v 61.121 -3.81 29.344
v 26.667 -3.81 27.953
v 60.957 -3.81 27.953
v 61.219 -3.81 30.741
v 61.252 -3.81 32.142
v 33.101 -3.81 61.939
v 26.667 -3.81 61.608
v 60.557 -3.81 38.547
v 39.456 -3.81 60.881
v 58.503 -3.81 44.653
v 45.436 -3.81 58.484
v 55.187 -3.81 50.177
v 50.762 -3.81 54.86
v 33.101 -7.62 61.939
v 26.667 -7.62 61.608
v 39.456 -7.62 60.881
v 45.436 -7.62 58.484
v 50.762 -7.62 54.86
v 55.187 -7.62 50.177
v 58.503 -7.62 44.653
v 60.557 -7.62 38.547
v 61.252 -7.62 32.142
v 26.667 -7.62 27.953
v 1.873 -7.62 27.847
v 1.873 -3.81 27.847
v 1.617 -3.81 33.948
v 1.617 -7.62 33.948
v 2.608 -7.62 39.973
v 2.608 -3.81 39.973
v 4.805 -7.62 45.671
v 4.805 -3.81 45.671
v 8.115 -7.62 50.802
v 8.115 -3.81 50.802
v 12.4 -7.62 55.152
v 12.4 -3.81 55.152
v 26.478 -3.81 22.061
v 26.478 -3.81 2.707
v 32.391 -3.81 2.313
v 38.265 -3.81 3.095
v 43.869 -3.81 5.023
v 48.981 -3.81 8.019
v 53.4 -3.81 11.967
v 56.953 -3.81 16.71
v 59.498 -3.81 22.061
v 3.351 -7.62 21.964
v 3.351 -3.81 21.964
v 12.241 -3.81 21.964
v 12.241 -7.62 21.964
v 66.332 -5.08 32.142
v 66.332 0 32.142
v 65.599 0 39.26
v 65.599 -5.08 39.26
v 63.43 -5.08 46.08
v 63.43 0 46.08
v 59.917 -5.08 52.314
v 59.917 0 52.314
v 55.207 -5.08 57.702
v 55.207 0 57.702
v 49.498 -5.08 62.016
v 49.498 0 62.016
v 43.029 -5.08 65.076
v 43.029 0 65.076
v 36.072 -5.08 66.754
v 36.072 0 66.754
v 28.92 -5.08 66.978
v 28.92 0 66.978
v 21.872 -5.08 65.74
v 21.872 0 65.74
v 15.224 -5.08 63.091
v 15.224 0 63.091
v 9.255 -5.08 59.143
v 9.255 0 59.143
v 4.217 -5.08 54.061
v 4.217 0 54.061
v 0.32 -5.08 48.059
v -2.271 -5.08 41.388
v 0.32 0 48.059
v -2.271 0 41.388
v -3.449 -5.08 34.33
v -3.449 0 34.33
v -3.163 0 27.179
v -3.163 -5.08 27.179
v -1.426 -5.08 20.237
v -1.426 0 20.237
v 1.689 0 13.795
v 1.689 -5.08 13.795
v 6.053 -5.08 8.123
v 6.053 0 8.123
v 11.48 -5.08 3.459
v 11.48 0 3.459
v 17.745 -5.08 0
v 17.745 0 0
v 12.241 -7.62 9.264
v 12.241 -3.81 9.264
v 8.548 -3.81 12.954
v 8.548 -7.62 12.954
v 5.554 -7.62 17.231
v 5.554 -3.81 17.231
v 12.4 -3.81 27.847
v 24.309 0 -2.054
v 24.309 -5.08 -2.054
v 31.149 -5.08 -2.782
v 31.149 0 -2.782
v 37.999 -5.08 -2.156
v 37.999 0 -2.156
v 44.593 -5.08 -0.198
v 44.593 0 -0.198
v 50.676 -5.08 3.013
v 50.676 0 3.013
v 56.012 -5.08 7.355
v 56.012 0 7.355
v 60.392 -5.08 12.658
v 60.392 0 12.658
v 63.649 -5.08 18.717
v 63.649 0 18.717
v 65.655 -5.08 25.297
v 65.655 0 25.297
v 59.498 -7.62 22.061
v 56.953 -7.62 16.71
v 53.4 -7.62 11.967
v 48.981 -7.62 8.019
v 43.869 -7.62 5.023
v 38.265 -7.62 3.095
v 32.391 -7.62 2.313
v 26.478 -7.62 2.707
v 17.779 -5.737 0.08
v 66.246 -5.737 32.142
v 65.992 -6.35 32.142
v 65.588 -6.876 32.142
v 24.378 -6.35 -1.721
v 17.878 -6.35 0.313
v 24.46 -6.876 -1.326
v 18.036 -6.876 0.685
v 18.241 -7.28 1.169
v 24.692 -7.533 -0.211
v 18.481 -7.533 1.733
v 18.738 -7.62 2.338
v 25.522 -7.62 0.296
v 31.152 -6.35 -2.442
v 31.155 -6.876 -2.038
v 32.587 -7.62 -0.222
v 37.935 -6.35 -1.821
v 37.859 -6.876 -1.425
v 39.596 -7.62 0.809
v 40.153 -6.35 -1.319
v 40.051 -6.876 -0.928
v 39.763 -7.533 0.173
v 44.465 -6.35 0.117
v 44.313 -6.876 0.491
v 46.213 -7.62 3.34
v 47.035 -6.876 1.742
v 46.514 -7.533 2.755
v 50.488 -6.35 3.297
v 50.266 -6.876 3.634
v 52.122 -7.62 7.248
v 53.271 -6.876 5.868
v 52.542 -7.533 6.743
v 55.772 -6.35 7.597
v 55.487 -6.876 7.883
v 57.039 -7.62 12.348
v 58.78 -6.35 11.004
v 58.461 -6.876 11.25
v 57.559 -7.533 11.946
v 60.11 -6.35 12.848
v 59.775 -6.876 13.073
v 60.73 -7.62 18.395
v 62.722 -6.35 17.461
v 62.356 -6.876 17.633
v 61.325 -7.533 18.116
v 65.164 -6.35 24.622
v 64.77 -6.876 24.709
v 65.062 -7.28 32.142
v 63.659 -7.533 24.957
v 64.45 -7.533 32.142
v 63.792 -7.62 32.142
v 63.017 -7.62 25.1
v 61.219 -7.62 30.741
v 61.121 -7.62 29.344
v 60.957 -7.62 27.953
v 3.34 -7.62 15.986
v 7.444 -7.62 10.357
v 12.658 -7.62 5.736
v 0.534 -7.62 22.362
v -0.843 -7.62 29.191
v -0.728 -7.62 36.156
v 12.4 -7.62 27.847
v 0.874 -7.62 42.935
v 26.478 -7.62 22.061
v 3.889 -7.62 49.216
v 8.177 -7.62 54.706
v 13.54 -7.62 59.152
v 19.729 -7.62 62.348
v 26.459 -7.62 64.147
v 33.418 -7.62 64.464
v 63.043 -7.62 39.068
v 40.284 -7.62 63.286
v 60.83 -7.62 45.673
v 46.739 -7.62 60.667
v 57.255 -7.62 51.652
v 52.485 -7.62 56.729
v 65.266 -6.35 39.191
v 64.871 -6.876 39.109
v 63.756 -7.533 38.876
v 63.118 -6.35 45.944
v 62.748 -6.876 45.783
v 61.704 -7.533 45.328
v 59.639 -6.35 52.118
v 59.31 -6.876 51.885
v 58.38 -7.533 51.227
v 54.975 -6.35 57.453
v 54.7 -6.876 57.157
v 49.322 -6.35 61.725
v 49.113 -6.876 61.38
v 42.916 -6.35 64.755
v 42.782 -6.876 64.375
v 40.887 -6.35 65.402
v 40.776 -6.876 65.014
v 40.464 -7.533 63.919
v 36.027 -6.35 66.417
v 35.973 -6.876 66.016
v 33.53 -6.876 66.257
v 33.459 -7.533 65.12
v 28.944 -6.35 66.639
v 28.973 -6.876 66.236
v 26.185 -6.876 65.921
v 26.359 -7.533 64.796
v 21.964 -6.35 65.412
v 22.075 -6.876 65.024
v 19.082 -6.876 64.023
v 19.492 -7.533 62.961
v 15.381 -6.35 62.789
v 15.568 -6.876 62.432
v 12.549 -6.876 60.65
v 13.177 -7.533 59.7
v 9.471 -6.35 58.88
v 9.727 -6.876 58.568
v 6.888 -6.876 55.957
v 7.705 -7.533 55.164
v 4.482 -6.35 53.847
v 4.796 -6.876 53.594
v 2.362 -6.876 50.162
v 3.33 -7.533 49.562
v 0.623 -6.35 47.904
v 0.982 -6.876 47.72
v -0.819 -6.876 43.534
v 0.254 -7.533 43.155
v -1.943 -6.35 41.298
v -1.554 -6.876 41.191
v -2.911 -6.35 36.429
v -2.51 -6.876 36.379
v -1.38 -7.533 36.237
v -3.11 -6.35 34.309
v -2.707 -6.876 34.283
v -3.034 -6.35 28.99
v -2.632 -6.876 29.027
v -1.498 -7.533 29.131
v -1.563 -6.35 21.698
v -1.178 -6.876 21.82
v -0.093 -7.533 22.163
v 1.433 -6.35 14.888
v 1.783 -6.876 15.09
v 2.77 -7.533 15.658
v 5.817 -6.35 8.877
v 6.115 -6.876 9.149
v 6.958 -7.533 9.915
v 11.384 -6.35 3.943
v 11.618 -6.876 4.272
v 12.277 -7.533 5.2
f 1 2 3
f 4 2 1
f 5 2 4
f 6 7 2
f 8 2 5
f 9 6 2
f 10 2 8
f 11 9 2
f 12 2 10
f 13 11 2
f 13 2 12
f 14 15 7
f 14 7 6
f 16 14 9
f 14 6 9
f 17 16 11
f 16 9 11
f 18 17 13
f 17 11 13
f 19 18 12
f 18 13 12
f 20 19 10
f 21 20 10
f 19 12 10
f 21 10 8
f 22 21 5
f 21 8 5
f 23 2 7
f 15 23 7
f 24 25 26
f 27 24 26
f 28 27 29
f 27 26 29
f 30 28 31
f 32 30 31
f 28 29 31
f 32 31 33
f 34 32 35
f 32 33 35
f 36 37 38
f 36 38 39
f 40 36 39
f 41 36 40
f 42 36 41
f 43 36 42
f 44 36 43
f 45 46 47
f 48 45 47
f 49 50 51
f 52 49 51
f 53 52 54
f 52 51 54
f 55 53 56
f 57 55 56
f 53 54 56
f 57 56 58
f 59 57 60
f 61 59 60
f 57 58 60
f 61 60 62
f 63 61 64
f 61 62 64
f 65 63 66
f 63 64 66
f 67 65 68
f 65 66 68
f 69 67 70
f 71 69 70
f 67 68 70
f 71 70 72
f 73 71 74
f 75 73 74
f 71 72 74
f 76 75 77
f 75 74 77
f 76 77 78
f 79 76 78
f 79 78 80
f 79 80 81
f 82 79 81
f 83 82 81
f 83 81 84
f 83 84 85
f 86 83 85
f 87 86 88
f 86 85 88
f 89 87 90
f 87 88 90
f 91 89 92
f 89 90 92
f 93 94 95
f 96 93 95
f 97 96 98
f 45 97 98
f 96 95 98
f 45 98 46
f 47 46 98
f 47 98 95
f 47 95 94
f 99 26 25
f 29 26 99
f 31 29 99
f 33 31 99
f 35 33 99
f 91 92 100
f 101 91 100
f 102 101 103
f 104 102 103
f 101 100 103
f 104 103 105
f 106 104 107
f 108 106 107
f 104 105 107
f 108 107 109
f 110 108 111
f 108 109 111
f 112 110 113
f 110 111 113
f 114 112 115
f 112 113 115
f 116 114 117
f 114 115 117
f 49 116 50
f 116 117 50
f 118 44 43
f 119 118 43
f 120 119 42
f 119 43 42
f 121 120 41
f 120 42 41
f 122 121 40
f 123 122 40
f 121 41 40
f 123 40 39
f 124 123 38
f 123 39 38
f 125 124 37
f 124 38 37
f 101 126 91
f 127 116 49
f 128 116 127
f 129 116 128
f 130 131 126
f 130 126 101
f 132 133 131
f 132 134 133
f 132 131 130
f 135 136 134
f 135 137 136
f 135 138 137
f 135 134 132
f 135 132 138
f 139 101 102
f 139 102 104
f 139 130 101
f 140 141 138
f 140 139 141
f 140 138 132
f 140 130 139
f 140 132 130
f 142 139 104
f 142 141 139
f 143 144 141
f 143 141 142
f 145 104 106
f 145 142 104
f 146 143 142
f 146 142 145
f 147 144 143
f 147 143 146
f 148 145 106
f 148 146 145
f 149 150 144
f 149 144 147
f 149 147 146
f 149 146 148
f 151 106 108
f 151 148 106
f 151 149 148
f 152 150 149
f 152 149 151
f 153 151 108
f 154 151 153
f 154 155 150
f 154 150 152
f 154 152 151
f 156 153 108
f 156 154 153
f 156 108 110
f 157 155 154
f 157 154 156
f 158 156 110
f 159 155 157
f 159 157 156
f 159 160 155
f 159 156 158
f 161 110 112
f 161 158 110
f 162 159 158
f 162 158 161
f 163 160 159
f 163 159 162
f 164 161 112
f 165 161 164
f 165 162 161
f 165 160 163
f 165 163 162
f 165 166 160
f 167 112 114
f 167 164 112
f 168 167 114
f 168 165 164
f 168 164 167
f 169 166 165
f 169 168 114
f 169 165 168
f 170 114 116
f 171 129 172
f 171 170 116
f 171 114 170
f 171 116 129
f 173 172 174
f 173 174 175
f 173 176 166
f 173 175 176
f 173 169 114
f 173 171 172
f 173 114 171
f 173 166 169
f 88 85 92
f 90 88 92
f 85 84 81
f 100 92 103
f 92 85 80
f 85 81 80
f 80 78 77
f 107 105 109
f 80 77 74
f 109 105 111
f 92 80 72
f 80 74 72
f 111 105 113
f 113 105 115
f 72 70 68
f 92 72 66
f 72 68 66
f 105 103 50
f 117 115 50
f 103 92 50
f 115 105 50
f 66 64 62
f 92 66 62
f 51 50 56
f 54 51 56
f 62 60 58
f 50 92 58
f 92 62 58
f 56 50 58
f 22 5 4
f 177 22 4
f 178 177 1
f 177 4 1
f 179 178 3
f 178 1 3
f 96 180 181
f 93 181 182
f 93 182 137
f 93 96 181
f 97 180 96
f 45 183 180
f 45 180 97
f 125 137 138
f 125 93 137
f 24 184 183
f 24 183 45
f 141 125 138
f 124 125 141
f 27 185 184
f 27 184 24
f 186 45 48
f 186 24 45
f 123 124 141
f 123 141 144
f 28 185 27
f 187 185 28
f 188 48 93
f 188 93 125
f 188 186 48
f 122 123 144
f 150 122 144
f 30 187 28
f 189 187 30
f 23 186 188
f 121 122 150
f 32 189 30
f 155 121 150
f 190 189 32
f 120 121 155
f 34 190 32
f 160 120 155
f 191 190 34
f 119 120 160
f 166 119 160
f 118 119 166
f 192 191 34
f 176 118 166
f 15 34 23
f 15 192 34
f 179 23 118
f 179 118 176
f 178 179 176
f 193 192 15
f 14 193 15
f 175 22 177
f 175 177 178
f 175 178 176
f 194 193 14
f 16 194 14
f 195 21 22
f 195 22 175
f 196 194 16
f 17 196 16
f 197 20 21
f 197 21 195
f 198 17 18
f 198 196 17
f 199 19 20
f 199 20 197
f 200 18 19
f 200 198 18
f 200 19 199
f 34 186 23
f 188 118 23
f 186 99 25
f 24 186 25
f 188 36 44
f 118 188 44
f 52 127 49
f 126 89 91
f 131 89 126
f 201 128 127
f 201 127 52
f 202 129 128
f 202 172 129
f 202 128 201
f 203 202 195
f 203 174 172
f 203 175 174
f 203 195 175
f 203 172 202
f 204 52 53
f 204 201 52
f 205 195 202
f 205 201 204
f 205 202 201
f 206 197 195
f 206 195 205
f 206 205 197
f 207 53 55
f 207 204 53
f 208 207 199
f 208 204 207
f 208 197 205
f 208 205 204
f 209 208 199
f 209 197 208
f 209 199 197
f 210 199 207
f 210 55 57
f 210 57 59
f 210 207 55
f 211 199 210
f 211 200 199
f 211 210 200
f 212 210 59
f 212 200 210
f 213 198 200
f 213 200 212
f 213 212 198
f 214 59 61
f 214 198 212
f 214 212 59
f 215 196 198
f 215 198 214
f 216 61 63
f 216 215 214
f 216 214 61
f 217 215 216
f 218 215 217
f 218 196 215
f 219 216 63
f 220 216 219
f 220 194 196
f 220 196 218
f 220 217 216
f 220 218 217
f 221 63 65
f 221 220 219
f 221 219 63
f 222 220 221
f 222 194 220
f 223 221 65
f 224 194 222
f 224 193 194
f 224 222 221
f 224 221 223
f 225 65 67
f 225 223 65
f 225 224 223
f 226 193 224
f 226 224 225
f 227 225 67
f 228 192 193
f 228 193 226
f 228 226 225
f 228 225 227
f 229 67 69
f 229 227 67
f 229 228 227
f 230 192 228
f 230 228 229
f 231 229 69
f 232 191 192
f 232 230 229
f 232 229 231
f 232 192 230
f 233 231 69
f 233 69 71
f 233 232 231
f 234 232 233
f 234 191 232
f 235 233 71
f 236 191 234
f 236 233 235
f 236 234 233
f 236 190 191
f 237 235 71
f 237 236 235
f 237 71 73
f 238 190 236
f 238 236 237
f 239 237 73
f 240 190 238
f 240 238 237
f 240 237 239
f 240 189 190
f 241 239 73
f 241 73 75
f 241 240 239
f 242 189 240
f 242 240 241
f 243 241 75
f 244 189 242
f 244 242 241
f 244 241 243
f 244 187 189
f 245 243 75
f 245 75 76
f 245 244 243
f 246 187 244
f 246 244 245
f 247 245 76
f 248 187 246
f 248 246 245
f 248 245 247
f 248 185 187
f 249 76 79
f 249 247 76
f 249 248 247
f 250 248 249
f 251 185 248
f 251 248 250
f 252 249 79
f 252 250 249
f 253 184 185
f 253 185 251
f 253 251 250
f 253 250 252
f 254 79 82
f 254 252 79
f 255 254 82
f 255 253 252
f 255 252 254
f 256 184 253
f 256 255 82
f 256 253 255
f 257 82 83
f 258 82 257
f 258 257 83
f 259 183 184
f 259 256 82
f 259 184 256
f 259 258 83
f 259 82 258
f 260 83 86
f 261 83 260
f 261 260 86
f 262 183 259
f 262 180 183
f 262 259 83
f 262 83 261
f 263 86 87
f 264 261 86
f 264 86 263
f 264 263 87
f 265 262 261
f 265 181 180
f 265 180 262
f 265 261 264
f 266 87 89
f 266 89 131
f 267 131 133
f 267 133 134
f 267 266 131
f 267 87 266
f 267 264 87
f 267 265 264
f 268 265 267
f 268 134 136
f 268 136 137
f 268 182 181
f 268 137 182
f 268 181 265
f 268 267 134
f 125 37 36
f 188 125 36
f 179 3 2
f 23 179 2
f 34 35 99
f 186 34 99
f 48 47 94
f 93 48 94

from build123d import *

# Parameters (mm, degrees)
F1_DEPTH = 7.62
F2_DEPTH = 3.81
F3_R     = 2.54


with BuildPart() as f1:
    # F0 (on Front) → F1 (new body)
    with BuildSketch(Plane.XZ):
        with BuildLine():
            ThreePointArc((17.744669, 0), (50.676236, 3.013402), (66.332194, 32.141733))
            ThreePointArc((66.332194, 32.141733), (12.138153, 61.270064), (17.744669, 0))
        make_face()
        with BuildLine():
            ThreePointArc((26.666769, 61.607856), (50.762375, 54.85959), (61.252194, 32.141733))
            ThreePointArc((61.252194, 32.141733), (61.178246, 30.042092), (60.956769, 27.952856))
            ThreePointArc((60.956769, 27.952856), (60.377684, 24.969932), (59.498295, 22.061351))
            ThreePointArc((59.498295, 22.061351), (46.499376, 6.393916), (26.478295, 2.706551))
            ThreePointArc((26.478295, 2.706551), (18.921559, 5.033931), (12.241204, 9.26404))
            ThreePointArc((12.241204, 9.26404), (6.957218, 15.02675), (3.351204, 21.96404))
            ThreePointArc((3.351204, 21.96404), (2.46218, 24.867794), (1.87284, 27.84686))
            ThreePointArc((1.87284, 27.84686), (3.560265, 42.87824), (12.400403, 55.15186))
            ThreePointArc((12.400403, 55.15186), (19.10262, 59.3322), (26.666769, 61.607856))
        make_face(mode=Mode.SUBTRACT)
        with BuildLine():
            Line((26.666769, 27.952856), (26.666769, 61.607856))
            ThreePointArc((26.666769, 61.607856), (19.10262, 59.3322), (12.400403, 55.15186))
            Line((12.400403, 55.15186), (12.400403, 27.84686))
            Line((12.400403, 27.84686), (1.87284, 27.84686))
            ThreePointArc((1.87284, 27.84686), (2.46218, 24.867794), (3.351204, 21.96404))
            Line((3.351204, 21.96404), (12.241204, 21.96404))
            Line((12.241204, 21.96404), (12.241204, 9.26404))
            ThreePointArc((12.241204, 9.26404), (18.921559, 5.033931), (26.478295, 2.706551))
            Line((26.478295, 2.706551), (26.478295, 22.061351))
            Line((26.478295, 22.061351), (59.498295, 22.061351))
            ThreePointArc((59.498295, 22.061351), (60.377684, 24.969932), (60.956769, 27.952856))
            Line((60.956769, 27.952856), (26.666769, 27.952856))
        make_face()
    extrude(amount=F1_DEPTH)

    # F0 (on Front) → F2 (join)
    with BuildSketch(Plane.XZ):
        with BuildLine():
            Line((12.400403, 27.84686), (12.400403, 55.15186))
            ThreePointArc((12.400403, 55.15186), (3.560265, 42.87824), (1.87284, 27.84686))
            Line((1.87284, 27.84686), (12.400403, 27.84686))
        make_face()
        with BuildLine():
            ThreePointArc((60.956769, 27.952856), (61.178246, 30.042092), (61.252194, 32.141733))
            ThreePointArc((61.252194, 32.141733), (50.762375, 54.85959), (26.666769, 61.607856))
            Line((26.666769, 61.607856), (26.666769, 27.952856))
            Line((26.666769, 27.952856), (60.956769, 27.952856))
        make_face()
        with BuildLine():
            ThreePointArc((26.478295, 2.706551), (46.499376, 6.393916), (59.498295, 22.061351))
            Line((59.498295, 22.061351), (26.478295, 22.061351))
            Line((26.478295, 22.061351), (26.478295, 2.706551))
        make_face()
        with BuildLine():
            Line((12.241204, 21.96404), (3.351204, 21.96404))
            ThreePointArc((3.351204, 21.96404), (6.957218, 15.02675), (12.241204, 9.26404))
            Line((12.241204, 9.26404), (12.241204, 21.96404))
        make_face()
    extrude(amount=F2_DEPTH)

    # F3
    f3_edges = [f1.edges().sort_by_distance(p)[0] for p in [
        (45.06972, -7.62, 64.283466),
    ]]
    fillet(f3_edges, radius=F3_R)


solid = f1.part
